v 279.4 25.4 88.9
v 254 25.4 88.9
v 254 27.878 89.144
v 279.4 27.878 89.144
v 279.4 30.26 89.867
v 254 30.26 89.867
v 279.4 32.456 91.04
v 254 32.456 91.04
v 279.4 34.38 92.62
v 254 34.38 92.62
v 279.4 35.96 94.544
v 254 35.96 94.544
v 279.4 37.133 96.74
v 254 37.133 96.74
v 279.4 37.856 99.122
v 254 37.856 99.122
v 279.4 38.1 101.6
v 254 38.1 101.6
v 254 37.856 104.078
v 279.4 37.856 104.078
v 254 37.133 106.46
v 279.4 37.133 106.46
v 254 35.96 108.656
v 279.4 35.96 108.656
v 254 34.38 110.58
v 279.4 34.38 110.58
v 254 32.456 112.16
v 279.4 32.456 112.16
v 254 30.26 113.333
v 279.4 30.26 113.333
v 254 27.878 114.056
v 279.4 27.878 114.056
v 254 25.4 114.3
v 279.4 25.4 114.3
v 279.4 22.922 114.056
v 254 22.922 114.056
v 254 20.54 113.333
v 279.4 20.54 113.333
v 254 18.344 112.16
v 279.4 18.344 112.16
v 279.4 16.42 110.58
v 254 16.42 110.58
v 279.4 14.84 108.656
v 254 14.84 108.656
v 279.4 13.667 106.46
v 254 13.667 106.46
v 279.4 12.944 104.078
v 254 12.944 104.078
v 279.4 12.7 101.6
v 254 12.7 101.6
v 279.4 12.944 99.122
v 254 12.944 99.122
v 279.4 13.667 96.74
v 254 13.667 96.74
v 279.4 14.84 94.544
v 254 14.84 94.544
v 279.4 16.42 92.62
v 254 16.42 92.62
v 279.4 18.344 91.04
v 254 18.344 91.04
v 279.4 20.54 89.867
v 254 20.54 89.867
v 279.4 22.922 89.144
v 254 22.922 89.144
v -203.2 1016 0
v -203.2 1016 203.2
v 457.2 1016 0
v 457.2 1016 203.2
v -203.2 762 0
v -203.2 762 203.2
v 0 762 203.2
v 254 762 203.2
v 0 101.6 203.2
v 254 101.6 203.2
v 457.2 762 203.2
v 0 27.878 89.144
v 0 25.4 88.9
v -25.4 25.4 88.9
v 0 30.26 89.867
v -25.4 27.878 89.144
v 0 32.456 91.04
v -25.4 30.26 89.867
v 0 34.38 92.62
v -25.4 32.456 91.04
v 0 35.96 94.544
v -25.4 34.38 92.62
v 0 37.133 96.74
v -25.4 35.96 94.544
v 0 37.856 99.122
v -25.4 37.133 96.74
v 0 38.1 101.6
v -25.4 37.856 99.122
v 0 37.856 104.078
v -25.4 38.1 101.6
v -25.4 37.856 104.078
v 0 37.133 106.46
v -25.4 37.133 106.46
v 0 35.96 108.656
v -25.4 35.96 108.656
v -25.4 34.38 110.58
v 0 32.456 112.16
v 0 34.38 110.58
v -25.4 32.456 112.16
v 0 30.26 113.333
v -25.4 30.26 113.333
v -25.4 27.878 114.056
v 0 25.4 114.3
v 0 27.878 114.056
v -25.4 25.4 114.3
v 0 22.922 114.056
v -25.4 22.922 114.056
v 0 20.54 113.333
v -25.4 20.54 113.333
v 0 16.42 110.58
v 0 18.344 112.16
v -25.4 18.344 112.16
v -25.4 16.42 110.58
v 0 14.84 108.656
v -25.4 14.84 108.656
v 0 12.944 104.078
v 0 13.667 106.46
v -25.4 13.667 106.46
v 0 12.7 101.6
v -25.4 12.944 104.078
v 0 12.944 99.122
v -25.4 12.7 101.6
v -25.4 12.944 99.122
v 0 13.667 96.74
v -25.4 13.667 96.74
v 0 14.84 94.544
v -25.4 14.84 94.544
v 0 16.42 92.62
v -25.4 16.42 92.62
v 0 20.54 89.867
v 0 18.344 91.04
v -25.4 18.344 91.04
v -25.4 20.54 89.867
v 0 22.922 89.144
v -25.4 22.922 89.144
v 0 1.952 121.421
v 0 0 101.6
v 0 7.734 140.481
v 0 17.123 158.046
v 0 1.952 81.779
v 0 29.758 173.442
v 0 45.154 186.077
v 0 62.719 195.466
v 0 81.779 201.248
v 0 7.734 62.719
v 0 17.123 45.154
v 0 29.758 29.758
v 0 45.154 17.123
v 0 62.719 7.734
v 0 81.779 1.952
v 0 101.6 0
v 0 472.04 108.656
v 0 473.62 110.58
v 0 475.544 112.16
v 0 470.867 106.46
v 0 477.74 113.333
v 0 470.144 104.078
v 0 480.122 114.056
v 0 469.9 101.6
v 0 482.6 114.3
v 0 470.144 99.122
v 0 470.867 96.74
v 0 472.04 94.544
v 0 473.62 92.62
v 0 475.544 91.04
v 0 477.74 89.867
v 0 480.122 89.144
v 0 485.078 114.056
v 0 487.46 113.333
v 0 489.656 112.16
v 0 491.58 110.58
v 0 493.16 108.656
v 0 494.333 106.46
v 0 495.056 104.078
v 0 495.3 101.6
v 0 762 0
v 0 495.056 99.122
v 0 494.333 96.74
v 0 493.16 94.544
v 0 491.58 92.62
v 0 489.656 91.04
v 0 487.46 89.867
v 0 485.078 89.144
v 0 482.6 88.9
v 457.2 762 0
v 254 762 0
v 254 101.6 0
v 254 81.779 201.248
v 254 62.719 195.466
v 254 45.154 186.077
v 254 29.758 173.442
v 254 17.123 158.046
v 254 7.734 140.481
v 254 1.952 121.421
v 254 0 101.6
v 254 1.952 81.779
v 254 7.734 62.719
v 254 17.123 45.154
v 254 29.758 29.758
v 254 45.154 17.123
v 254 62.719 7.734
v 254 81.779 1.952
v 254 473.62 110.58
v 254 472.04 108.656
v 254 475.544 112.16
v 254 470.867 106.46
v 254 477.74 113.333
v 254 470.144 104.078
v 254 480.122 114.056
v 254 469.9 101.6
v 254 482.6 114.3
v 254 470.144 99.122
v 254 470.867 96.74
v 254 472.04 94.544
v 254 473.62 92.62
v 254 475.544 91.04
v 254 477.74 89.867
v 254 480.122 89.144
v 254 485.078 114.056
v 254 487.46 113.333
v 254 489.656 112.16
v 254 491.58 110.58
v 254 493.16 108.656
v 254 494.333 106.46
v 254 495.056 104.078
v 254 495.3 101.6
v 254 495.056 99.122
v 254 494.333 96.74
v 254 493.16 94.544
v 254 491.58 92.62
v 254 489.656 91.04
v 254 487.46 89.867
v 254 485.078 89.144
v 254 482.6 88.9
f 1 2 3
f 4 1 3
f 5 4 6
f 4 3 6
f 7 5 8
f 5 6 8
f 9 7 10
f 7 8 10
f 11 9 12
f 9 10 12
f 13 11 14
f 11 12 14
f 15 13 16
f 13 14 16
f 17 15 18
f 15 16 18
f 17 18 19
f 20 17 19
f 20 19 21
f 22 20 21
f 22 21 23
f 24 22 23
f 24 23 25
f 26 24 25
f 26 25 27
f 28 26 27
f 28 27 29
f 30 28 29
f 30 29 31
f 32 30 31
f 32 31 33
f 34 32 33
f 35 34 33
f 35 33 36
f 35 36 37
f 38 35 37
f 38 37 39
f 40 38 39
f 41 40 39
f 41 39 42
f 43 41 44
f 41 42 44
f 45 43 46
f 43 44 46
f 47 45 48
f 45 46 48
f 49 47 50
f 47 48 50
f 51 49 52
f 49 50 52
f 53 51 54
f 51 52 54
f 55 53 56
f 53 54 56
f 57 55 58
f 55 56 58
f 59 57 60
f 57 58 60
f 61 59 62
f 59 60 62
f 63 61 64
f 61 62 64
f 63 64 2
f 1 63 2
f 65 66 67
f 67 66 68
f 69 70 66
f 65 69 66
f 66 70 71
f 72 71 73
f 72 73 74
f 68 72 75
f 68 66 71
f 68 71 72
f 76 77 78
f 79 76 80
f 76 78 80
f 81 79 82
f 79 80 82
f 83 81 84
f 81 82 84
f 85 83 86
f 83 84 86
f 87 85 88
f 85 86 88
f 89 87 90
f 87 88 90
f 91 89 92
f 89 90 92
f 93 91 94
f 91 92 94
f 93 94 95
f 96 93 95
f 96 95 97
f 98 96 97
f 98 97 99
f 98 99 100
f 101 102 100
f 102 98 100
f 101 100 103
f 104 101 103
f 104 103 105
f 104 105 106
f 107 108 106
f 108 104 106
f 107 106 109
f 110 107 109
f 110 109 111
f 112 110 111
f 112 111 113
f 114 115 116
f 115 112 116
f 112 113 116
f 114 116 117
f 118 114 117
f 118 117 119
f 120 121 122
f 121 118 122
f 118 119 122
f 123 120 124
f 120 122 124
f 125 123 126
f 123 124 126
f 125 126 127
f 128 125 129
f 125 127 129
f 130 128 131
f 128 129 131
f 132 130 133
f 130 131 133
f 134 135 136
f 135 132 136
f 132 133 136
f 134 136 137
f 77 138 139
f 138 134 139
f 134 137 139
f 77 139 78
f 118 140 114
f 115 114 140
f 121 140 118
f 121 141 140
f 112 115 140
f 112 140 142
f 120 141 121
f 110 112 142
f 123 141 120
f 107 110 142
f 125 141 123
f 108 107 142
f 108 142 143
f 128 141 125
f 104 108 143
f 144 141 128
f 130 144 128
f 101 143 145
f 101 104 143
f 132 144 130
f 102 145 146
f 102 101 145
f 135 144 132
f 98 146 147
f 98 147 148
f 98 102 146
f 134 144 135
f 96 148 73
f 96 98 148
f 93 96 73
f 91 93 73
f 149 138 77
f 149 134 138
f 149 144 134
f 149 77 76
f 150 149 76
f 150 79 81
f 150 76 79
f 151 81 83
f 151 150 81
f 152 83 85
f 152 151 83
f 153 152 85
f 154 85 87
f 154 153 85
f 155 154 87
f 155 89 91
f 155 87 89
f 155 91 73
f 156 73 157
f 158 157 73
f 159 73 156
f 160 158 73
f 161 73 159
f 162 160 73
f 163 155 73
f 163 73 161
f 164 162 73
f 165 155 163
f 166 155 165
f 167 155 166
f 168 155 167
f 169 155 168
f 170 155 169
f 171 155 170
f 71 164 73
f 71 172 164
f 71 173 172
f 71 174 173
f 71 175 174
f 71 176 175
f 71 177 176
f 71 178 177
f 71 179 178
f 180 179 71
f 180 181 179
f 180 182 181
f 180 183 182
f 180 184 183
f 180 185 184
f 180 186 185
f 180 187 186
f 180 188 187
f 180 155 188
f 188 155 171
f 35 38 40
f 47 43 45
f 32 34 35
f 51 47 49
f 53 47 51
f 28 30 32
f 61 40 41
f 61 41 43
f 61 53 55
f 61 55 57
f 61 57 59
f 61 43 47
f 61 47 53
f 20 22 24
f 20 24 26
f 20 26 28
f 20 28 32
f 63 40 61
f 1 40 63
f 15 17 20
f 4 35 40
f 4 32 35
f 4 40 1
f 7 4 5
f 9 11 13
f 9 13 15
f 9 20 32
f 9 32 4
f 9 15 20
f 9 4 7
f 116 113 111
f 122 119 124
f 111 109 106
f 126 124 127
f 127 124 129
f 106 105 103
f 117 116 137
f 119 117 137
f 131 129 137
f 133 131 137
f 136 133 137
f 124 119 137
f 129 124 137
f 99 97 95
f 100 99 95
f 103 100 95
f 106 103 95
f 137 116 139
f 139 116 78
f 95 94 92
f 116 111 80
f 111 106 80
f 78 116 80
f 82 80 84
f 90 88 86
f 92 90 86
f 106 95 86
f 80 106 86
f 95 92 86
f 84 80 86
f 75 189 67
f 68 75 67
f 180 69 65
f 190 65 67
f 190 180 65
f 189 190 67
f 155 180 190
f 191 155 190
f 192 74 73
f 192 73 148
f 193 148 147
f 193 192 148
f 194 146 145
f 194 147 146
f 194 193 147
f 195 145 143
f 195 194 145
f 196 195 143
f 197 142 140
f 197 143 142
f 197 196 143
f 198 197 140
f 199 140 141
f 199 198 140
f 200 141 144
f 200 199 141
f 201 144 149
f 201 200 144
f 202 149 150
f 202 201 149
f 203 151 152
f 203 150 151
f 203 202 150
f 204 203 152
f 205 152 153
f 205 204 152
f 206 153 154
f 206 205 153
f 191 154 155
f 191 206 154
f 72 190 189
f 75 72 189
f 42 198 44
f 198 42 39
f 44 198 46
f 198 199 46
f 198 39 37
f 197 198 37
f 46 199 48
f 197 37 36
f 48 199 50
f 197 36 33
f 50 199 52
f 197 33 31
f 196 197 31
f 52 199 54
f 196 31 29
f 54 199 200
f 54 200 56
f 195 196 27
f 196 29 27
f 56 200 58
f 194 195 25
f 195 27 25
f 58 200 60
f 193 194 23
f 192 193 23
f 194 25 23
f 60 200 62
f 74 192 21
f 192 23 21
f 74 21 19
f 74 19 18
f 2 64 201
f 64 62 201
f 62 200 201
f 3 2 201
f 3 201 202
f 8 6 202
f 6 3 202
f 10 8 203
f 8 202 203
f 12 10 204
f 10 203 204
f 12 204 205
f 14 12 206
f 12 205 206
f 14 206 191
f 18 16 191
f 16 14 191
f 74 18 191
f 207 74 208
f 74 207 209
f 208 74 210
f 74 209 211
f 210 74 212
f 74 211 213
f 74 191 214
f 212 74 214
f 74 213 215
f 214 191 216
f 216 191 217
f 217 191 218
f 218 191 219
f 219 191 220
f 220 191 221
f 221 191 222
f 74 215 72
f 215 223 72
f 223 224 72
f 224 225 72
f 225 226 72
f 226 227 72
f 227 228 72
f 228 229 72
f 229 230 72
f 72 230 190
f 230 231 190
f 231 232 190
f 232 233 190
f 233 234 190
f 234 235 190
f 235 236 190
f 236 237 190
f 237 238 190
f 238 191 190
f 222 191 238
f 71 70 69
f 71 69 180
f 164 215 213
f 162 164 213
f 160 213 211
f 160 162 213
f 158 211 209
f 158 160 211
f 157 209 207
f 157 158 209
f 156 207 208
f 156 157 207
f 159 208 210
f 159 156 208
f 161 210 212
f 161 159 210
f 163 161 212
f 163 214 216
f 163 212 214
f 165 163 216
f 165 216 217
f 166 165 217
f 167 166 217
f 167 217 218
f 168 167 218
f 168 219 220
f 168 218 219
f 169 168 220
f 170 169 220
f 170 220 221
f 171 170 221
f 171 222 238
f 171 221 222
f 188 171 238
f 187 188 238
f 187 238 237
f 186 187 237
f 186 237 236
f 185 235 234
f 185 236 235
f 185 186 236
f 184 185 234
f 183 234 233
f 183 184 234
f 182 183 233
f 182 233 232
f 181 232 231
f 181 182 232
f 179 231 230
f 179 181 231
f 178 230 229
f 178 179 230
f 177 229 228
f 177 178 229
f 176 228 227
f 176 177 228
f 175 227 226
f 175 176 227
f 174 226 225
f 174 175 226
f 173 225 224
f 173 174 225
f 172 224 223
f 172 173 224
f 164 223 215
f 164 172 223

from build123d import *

# Parameters (mm, degrees)
SKETCH1_W                       = 254
SKETCH1_H                       = 1016
BOSS_EXTRUDE1_DEPTH             = 203.2
FILLET1_RADIUS                  = 101.6
FILLET1_LENGTH                  = 254
BOSS_EXTRUDE2_DEPTH             = 25.4
BOSS_EXTRUDE2_DEPTH_BACK        = 279.4
SKETCH2_R                       = 12.7
CUT_EXTRUDE1_DEPTH              = 195.834
CUT_EXTRUDE1_DEPTH_BACK         = 440.182
SKETCH4_R                       = 12.7
BOSS_EXTRUDE3_REACH             = 1060.604
SKETCH5_W                       = 660.4
SKETCH5_H                       = 254
BOSS_EXTRUDE3_DIRECTION_2_REACH = 1060.604


with BuildPart() as part:
    # Sketch1 → Boss-Extrude1 (new body)
    with BuildSketch(Plane.XY):
        with Locations((127, 508)):
            Rectangle(SKETCH1_W, SKETCH1_H)
    extrude(amount=BOSS_EXTRUDE1_DEPTH)

    # Fillet1: full round fillet: the end face becomes a half cylinder, R = half its width
    fillet1_face = Plane((127, 0, 101.6), x_dir=(1, 0, 0), z_dir=(0, -1, 0))  # on the end face: x along it, z out of the body
    fillet1_slab = fillet1_face.offset(-FILLET1_RADIUS / 2) * Box(FILLET1_LENGTH, 2 * FILLET1_RADIUS, FILLET1_RADIUS, mode=Mode.PRIVATE)  # the body's end, R deep
    fillet1_round = Plane((127, 101.6, 101.6), x_dir=(0, -1, 0), z_dir=(1, 0, 0)) * Cylinder(FILLET1_RADIUS, FILLET1_LENGTH, mode=Mode.PRIVATE)  # its axis R under the face
    add(fillet1_slab - fillet1_round, mode=Mode.SUBTRACT)

    # Sketch2 → Boss-Extrude2 (add, two sides: drawn at the far end of the back side and taken through both)
    with BuildSketch(Plane(origin=(254, 0, 0), x_dir=(0, 0, -1), z_dir=(1, 0, 0)).offset(-BOSS_EXTRUDE2_DEPTH_BACK)):
        with Locations((-101.6, 25.4)):
            Circle(SKETCH2_R)
    extrude(amount=BOSS_EXTRUDE2_DEPTH + BOSS_EXTRUDE2_DEPTH_BACK)

    # Sketch4 → Cut-Extrude1 (cut, two sides: drawn at the far end of the back side and taken through both)
    with BuildSketch(Plane(origin=(254, 0, 0), x_dir=(0, 0, -1), z_dir=(1, 0, 0)).offset(-CUT_EXTRUDE1_DEPTH_BACK)):
        with Locations(Location((-101.6, 482.6, 0), (0, 0, 180))):
            Circle(SKETCH4_R)
    extrude(amount=CUT_EXTRUDE1_DEPTH + CUT_EXTRUDE1_DEPTH_BACK, mode=Mode.SUBTRACT)

    # Boss-Extrude3: up to this face of the body (flat: up to its plane)
    boss_extrude3_end = Plane(part.part.faces().sort_by_distance((127, 558.8, 203.2))[0])
    # Sketch5 → Boss-Extrude3 (add, up to the picked face)
    with BuildSketch(Plane.XY.offset(101.6), mode=Mode.PRIVATE) as boss_extrude3_sk1:
        with Locations((127, 889)):
            Rectangle(SKETCH5_W, SKETCH5_H)
    boss_extrude3_tool1 = split(extrude(boss_extrude3_sk1.sketch, amount=BOSS_EXTRUDE3_REACH, mode=Mode.PRIVATE), bisect_by=boss_extrude3_end, keep=Keep.BOTH, mode=Mode.PRIVATE)
    add(boss_extrude3_tool1.solids().sort_by(Axis((127, 889, 101.6), (0, 0, 1)))[0])

    # Boss-Extrude3 direction 2: up to this face of the body (flat: up to its plane)
    boss_extrude3_direction_2_end = Plane(part.part.faces().sort_by_distance((127, 558.8, 0))[0])
    # Sketch5 → Boss-Extrude3 direction 2 (add, up to the picked face)
    with BuildSketch(Plane.XY.offset(101.6), mode=Mode.PRIVATE) as boss_extrude3_direction_2_sk1:
        with Locations((127, 889)):
            Rectangle(SKETCH5_W, SKETCH5_H)
    boss_extrude3_direction_2_tool1 = split(extrude(boss_extrude3_direction_2_sk1.sketch, amount=-BOSS_EXTRUDE3_DIRECTION_2_REACH, mode=Mode.PRIVATE), bisect_by=boss_extrude3_direction_2_end, keep=Keep.BOTH, mode=Mode.PRIVATE)
    add(boss_extrude3_direction_2_tool1.solids().sort_by(Axis((127, 889, 101.6), (0, 0, -1)))[0])


solid = part.part
